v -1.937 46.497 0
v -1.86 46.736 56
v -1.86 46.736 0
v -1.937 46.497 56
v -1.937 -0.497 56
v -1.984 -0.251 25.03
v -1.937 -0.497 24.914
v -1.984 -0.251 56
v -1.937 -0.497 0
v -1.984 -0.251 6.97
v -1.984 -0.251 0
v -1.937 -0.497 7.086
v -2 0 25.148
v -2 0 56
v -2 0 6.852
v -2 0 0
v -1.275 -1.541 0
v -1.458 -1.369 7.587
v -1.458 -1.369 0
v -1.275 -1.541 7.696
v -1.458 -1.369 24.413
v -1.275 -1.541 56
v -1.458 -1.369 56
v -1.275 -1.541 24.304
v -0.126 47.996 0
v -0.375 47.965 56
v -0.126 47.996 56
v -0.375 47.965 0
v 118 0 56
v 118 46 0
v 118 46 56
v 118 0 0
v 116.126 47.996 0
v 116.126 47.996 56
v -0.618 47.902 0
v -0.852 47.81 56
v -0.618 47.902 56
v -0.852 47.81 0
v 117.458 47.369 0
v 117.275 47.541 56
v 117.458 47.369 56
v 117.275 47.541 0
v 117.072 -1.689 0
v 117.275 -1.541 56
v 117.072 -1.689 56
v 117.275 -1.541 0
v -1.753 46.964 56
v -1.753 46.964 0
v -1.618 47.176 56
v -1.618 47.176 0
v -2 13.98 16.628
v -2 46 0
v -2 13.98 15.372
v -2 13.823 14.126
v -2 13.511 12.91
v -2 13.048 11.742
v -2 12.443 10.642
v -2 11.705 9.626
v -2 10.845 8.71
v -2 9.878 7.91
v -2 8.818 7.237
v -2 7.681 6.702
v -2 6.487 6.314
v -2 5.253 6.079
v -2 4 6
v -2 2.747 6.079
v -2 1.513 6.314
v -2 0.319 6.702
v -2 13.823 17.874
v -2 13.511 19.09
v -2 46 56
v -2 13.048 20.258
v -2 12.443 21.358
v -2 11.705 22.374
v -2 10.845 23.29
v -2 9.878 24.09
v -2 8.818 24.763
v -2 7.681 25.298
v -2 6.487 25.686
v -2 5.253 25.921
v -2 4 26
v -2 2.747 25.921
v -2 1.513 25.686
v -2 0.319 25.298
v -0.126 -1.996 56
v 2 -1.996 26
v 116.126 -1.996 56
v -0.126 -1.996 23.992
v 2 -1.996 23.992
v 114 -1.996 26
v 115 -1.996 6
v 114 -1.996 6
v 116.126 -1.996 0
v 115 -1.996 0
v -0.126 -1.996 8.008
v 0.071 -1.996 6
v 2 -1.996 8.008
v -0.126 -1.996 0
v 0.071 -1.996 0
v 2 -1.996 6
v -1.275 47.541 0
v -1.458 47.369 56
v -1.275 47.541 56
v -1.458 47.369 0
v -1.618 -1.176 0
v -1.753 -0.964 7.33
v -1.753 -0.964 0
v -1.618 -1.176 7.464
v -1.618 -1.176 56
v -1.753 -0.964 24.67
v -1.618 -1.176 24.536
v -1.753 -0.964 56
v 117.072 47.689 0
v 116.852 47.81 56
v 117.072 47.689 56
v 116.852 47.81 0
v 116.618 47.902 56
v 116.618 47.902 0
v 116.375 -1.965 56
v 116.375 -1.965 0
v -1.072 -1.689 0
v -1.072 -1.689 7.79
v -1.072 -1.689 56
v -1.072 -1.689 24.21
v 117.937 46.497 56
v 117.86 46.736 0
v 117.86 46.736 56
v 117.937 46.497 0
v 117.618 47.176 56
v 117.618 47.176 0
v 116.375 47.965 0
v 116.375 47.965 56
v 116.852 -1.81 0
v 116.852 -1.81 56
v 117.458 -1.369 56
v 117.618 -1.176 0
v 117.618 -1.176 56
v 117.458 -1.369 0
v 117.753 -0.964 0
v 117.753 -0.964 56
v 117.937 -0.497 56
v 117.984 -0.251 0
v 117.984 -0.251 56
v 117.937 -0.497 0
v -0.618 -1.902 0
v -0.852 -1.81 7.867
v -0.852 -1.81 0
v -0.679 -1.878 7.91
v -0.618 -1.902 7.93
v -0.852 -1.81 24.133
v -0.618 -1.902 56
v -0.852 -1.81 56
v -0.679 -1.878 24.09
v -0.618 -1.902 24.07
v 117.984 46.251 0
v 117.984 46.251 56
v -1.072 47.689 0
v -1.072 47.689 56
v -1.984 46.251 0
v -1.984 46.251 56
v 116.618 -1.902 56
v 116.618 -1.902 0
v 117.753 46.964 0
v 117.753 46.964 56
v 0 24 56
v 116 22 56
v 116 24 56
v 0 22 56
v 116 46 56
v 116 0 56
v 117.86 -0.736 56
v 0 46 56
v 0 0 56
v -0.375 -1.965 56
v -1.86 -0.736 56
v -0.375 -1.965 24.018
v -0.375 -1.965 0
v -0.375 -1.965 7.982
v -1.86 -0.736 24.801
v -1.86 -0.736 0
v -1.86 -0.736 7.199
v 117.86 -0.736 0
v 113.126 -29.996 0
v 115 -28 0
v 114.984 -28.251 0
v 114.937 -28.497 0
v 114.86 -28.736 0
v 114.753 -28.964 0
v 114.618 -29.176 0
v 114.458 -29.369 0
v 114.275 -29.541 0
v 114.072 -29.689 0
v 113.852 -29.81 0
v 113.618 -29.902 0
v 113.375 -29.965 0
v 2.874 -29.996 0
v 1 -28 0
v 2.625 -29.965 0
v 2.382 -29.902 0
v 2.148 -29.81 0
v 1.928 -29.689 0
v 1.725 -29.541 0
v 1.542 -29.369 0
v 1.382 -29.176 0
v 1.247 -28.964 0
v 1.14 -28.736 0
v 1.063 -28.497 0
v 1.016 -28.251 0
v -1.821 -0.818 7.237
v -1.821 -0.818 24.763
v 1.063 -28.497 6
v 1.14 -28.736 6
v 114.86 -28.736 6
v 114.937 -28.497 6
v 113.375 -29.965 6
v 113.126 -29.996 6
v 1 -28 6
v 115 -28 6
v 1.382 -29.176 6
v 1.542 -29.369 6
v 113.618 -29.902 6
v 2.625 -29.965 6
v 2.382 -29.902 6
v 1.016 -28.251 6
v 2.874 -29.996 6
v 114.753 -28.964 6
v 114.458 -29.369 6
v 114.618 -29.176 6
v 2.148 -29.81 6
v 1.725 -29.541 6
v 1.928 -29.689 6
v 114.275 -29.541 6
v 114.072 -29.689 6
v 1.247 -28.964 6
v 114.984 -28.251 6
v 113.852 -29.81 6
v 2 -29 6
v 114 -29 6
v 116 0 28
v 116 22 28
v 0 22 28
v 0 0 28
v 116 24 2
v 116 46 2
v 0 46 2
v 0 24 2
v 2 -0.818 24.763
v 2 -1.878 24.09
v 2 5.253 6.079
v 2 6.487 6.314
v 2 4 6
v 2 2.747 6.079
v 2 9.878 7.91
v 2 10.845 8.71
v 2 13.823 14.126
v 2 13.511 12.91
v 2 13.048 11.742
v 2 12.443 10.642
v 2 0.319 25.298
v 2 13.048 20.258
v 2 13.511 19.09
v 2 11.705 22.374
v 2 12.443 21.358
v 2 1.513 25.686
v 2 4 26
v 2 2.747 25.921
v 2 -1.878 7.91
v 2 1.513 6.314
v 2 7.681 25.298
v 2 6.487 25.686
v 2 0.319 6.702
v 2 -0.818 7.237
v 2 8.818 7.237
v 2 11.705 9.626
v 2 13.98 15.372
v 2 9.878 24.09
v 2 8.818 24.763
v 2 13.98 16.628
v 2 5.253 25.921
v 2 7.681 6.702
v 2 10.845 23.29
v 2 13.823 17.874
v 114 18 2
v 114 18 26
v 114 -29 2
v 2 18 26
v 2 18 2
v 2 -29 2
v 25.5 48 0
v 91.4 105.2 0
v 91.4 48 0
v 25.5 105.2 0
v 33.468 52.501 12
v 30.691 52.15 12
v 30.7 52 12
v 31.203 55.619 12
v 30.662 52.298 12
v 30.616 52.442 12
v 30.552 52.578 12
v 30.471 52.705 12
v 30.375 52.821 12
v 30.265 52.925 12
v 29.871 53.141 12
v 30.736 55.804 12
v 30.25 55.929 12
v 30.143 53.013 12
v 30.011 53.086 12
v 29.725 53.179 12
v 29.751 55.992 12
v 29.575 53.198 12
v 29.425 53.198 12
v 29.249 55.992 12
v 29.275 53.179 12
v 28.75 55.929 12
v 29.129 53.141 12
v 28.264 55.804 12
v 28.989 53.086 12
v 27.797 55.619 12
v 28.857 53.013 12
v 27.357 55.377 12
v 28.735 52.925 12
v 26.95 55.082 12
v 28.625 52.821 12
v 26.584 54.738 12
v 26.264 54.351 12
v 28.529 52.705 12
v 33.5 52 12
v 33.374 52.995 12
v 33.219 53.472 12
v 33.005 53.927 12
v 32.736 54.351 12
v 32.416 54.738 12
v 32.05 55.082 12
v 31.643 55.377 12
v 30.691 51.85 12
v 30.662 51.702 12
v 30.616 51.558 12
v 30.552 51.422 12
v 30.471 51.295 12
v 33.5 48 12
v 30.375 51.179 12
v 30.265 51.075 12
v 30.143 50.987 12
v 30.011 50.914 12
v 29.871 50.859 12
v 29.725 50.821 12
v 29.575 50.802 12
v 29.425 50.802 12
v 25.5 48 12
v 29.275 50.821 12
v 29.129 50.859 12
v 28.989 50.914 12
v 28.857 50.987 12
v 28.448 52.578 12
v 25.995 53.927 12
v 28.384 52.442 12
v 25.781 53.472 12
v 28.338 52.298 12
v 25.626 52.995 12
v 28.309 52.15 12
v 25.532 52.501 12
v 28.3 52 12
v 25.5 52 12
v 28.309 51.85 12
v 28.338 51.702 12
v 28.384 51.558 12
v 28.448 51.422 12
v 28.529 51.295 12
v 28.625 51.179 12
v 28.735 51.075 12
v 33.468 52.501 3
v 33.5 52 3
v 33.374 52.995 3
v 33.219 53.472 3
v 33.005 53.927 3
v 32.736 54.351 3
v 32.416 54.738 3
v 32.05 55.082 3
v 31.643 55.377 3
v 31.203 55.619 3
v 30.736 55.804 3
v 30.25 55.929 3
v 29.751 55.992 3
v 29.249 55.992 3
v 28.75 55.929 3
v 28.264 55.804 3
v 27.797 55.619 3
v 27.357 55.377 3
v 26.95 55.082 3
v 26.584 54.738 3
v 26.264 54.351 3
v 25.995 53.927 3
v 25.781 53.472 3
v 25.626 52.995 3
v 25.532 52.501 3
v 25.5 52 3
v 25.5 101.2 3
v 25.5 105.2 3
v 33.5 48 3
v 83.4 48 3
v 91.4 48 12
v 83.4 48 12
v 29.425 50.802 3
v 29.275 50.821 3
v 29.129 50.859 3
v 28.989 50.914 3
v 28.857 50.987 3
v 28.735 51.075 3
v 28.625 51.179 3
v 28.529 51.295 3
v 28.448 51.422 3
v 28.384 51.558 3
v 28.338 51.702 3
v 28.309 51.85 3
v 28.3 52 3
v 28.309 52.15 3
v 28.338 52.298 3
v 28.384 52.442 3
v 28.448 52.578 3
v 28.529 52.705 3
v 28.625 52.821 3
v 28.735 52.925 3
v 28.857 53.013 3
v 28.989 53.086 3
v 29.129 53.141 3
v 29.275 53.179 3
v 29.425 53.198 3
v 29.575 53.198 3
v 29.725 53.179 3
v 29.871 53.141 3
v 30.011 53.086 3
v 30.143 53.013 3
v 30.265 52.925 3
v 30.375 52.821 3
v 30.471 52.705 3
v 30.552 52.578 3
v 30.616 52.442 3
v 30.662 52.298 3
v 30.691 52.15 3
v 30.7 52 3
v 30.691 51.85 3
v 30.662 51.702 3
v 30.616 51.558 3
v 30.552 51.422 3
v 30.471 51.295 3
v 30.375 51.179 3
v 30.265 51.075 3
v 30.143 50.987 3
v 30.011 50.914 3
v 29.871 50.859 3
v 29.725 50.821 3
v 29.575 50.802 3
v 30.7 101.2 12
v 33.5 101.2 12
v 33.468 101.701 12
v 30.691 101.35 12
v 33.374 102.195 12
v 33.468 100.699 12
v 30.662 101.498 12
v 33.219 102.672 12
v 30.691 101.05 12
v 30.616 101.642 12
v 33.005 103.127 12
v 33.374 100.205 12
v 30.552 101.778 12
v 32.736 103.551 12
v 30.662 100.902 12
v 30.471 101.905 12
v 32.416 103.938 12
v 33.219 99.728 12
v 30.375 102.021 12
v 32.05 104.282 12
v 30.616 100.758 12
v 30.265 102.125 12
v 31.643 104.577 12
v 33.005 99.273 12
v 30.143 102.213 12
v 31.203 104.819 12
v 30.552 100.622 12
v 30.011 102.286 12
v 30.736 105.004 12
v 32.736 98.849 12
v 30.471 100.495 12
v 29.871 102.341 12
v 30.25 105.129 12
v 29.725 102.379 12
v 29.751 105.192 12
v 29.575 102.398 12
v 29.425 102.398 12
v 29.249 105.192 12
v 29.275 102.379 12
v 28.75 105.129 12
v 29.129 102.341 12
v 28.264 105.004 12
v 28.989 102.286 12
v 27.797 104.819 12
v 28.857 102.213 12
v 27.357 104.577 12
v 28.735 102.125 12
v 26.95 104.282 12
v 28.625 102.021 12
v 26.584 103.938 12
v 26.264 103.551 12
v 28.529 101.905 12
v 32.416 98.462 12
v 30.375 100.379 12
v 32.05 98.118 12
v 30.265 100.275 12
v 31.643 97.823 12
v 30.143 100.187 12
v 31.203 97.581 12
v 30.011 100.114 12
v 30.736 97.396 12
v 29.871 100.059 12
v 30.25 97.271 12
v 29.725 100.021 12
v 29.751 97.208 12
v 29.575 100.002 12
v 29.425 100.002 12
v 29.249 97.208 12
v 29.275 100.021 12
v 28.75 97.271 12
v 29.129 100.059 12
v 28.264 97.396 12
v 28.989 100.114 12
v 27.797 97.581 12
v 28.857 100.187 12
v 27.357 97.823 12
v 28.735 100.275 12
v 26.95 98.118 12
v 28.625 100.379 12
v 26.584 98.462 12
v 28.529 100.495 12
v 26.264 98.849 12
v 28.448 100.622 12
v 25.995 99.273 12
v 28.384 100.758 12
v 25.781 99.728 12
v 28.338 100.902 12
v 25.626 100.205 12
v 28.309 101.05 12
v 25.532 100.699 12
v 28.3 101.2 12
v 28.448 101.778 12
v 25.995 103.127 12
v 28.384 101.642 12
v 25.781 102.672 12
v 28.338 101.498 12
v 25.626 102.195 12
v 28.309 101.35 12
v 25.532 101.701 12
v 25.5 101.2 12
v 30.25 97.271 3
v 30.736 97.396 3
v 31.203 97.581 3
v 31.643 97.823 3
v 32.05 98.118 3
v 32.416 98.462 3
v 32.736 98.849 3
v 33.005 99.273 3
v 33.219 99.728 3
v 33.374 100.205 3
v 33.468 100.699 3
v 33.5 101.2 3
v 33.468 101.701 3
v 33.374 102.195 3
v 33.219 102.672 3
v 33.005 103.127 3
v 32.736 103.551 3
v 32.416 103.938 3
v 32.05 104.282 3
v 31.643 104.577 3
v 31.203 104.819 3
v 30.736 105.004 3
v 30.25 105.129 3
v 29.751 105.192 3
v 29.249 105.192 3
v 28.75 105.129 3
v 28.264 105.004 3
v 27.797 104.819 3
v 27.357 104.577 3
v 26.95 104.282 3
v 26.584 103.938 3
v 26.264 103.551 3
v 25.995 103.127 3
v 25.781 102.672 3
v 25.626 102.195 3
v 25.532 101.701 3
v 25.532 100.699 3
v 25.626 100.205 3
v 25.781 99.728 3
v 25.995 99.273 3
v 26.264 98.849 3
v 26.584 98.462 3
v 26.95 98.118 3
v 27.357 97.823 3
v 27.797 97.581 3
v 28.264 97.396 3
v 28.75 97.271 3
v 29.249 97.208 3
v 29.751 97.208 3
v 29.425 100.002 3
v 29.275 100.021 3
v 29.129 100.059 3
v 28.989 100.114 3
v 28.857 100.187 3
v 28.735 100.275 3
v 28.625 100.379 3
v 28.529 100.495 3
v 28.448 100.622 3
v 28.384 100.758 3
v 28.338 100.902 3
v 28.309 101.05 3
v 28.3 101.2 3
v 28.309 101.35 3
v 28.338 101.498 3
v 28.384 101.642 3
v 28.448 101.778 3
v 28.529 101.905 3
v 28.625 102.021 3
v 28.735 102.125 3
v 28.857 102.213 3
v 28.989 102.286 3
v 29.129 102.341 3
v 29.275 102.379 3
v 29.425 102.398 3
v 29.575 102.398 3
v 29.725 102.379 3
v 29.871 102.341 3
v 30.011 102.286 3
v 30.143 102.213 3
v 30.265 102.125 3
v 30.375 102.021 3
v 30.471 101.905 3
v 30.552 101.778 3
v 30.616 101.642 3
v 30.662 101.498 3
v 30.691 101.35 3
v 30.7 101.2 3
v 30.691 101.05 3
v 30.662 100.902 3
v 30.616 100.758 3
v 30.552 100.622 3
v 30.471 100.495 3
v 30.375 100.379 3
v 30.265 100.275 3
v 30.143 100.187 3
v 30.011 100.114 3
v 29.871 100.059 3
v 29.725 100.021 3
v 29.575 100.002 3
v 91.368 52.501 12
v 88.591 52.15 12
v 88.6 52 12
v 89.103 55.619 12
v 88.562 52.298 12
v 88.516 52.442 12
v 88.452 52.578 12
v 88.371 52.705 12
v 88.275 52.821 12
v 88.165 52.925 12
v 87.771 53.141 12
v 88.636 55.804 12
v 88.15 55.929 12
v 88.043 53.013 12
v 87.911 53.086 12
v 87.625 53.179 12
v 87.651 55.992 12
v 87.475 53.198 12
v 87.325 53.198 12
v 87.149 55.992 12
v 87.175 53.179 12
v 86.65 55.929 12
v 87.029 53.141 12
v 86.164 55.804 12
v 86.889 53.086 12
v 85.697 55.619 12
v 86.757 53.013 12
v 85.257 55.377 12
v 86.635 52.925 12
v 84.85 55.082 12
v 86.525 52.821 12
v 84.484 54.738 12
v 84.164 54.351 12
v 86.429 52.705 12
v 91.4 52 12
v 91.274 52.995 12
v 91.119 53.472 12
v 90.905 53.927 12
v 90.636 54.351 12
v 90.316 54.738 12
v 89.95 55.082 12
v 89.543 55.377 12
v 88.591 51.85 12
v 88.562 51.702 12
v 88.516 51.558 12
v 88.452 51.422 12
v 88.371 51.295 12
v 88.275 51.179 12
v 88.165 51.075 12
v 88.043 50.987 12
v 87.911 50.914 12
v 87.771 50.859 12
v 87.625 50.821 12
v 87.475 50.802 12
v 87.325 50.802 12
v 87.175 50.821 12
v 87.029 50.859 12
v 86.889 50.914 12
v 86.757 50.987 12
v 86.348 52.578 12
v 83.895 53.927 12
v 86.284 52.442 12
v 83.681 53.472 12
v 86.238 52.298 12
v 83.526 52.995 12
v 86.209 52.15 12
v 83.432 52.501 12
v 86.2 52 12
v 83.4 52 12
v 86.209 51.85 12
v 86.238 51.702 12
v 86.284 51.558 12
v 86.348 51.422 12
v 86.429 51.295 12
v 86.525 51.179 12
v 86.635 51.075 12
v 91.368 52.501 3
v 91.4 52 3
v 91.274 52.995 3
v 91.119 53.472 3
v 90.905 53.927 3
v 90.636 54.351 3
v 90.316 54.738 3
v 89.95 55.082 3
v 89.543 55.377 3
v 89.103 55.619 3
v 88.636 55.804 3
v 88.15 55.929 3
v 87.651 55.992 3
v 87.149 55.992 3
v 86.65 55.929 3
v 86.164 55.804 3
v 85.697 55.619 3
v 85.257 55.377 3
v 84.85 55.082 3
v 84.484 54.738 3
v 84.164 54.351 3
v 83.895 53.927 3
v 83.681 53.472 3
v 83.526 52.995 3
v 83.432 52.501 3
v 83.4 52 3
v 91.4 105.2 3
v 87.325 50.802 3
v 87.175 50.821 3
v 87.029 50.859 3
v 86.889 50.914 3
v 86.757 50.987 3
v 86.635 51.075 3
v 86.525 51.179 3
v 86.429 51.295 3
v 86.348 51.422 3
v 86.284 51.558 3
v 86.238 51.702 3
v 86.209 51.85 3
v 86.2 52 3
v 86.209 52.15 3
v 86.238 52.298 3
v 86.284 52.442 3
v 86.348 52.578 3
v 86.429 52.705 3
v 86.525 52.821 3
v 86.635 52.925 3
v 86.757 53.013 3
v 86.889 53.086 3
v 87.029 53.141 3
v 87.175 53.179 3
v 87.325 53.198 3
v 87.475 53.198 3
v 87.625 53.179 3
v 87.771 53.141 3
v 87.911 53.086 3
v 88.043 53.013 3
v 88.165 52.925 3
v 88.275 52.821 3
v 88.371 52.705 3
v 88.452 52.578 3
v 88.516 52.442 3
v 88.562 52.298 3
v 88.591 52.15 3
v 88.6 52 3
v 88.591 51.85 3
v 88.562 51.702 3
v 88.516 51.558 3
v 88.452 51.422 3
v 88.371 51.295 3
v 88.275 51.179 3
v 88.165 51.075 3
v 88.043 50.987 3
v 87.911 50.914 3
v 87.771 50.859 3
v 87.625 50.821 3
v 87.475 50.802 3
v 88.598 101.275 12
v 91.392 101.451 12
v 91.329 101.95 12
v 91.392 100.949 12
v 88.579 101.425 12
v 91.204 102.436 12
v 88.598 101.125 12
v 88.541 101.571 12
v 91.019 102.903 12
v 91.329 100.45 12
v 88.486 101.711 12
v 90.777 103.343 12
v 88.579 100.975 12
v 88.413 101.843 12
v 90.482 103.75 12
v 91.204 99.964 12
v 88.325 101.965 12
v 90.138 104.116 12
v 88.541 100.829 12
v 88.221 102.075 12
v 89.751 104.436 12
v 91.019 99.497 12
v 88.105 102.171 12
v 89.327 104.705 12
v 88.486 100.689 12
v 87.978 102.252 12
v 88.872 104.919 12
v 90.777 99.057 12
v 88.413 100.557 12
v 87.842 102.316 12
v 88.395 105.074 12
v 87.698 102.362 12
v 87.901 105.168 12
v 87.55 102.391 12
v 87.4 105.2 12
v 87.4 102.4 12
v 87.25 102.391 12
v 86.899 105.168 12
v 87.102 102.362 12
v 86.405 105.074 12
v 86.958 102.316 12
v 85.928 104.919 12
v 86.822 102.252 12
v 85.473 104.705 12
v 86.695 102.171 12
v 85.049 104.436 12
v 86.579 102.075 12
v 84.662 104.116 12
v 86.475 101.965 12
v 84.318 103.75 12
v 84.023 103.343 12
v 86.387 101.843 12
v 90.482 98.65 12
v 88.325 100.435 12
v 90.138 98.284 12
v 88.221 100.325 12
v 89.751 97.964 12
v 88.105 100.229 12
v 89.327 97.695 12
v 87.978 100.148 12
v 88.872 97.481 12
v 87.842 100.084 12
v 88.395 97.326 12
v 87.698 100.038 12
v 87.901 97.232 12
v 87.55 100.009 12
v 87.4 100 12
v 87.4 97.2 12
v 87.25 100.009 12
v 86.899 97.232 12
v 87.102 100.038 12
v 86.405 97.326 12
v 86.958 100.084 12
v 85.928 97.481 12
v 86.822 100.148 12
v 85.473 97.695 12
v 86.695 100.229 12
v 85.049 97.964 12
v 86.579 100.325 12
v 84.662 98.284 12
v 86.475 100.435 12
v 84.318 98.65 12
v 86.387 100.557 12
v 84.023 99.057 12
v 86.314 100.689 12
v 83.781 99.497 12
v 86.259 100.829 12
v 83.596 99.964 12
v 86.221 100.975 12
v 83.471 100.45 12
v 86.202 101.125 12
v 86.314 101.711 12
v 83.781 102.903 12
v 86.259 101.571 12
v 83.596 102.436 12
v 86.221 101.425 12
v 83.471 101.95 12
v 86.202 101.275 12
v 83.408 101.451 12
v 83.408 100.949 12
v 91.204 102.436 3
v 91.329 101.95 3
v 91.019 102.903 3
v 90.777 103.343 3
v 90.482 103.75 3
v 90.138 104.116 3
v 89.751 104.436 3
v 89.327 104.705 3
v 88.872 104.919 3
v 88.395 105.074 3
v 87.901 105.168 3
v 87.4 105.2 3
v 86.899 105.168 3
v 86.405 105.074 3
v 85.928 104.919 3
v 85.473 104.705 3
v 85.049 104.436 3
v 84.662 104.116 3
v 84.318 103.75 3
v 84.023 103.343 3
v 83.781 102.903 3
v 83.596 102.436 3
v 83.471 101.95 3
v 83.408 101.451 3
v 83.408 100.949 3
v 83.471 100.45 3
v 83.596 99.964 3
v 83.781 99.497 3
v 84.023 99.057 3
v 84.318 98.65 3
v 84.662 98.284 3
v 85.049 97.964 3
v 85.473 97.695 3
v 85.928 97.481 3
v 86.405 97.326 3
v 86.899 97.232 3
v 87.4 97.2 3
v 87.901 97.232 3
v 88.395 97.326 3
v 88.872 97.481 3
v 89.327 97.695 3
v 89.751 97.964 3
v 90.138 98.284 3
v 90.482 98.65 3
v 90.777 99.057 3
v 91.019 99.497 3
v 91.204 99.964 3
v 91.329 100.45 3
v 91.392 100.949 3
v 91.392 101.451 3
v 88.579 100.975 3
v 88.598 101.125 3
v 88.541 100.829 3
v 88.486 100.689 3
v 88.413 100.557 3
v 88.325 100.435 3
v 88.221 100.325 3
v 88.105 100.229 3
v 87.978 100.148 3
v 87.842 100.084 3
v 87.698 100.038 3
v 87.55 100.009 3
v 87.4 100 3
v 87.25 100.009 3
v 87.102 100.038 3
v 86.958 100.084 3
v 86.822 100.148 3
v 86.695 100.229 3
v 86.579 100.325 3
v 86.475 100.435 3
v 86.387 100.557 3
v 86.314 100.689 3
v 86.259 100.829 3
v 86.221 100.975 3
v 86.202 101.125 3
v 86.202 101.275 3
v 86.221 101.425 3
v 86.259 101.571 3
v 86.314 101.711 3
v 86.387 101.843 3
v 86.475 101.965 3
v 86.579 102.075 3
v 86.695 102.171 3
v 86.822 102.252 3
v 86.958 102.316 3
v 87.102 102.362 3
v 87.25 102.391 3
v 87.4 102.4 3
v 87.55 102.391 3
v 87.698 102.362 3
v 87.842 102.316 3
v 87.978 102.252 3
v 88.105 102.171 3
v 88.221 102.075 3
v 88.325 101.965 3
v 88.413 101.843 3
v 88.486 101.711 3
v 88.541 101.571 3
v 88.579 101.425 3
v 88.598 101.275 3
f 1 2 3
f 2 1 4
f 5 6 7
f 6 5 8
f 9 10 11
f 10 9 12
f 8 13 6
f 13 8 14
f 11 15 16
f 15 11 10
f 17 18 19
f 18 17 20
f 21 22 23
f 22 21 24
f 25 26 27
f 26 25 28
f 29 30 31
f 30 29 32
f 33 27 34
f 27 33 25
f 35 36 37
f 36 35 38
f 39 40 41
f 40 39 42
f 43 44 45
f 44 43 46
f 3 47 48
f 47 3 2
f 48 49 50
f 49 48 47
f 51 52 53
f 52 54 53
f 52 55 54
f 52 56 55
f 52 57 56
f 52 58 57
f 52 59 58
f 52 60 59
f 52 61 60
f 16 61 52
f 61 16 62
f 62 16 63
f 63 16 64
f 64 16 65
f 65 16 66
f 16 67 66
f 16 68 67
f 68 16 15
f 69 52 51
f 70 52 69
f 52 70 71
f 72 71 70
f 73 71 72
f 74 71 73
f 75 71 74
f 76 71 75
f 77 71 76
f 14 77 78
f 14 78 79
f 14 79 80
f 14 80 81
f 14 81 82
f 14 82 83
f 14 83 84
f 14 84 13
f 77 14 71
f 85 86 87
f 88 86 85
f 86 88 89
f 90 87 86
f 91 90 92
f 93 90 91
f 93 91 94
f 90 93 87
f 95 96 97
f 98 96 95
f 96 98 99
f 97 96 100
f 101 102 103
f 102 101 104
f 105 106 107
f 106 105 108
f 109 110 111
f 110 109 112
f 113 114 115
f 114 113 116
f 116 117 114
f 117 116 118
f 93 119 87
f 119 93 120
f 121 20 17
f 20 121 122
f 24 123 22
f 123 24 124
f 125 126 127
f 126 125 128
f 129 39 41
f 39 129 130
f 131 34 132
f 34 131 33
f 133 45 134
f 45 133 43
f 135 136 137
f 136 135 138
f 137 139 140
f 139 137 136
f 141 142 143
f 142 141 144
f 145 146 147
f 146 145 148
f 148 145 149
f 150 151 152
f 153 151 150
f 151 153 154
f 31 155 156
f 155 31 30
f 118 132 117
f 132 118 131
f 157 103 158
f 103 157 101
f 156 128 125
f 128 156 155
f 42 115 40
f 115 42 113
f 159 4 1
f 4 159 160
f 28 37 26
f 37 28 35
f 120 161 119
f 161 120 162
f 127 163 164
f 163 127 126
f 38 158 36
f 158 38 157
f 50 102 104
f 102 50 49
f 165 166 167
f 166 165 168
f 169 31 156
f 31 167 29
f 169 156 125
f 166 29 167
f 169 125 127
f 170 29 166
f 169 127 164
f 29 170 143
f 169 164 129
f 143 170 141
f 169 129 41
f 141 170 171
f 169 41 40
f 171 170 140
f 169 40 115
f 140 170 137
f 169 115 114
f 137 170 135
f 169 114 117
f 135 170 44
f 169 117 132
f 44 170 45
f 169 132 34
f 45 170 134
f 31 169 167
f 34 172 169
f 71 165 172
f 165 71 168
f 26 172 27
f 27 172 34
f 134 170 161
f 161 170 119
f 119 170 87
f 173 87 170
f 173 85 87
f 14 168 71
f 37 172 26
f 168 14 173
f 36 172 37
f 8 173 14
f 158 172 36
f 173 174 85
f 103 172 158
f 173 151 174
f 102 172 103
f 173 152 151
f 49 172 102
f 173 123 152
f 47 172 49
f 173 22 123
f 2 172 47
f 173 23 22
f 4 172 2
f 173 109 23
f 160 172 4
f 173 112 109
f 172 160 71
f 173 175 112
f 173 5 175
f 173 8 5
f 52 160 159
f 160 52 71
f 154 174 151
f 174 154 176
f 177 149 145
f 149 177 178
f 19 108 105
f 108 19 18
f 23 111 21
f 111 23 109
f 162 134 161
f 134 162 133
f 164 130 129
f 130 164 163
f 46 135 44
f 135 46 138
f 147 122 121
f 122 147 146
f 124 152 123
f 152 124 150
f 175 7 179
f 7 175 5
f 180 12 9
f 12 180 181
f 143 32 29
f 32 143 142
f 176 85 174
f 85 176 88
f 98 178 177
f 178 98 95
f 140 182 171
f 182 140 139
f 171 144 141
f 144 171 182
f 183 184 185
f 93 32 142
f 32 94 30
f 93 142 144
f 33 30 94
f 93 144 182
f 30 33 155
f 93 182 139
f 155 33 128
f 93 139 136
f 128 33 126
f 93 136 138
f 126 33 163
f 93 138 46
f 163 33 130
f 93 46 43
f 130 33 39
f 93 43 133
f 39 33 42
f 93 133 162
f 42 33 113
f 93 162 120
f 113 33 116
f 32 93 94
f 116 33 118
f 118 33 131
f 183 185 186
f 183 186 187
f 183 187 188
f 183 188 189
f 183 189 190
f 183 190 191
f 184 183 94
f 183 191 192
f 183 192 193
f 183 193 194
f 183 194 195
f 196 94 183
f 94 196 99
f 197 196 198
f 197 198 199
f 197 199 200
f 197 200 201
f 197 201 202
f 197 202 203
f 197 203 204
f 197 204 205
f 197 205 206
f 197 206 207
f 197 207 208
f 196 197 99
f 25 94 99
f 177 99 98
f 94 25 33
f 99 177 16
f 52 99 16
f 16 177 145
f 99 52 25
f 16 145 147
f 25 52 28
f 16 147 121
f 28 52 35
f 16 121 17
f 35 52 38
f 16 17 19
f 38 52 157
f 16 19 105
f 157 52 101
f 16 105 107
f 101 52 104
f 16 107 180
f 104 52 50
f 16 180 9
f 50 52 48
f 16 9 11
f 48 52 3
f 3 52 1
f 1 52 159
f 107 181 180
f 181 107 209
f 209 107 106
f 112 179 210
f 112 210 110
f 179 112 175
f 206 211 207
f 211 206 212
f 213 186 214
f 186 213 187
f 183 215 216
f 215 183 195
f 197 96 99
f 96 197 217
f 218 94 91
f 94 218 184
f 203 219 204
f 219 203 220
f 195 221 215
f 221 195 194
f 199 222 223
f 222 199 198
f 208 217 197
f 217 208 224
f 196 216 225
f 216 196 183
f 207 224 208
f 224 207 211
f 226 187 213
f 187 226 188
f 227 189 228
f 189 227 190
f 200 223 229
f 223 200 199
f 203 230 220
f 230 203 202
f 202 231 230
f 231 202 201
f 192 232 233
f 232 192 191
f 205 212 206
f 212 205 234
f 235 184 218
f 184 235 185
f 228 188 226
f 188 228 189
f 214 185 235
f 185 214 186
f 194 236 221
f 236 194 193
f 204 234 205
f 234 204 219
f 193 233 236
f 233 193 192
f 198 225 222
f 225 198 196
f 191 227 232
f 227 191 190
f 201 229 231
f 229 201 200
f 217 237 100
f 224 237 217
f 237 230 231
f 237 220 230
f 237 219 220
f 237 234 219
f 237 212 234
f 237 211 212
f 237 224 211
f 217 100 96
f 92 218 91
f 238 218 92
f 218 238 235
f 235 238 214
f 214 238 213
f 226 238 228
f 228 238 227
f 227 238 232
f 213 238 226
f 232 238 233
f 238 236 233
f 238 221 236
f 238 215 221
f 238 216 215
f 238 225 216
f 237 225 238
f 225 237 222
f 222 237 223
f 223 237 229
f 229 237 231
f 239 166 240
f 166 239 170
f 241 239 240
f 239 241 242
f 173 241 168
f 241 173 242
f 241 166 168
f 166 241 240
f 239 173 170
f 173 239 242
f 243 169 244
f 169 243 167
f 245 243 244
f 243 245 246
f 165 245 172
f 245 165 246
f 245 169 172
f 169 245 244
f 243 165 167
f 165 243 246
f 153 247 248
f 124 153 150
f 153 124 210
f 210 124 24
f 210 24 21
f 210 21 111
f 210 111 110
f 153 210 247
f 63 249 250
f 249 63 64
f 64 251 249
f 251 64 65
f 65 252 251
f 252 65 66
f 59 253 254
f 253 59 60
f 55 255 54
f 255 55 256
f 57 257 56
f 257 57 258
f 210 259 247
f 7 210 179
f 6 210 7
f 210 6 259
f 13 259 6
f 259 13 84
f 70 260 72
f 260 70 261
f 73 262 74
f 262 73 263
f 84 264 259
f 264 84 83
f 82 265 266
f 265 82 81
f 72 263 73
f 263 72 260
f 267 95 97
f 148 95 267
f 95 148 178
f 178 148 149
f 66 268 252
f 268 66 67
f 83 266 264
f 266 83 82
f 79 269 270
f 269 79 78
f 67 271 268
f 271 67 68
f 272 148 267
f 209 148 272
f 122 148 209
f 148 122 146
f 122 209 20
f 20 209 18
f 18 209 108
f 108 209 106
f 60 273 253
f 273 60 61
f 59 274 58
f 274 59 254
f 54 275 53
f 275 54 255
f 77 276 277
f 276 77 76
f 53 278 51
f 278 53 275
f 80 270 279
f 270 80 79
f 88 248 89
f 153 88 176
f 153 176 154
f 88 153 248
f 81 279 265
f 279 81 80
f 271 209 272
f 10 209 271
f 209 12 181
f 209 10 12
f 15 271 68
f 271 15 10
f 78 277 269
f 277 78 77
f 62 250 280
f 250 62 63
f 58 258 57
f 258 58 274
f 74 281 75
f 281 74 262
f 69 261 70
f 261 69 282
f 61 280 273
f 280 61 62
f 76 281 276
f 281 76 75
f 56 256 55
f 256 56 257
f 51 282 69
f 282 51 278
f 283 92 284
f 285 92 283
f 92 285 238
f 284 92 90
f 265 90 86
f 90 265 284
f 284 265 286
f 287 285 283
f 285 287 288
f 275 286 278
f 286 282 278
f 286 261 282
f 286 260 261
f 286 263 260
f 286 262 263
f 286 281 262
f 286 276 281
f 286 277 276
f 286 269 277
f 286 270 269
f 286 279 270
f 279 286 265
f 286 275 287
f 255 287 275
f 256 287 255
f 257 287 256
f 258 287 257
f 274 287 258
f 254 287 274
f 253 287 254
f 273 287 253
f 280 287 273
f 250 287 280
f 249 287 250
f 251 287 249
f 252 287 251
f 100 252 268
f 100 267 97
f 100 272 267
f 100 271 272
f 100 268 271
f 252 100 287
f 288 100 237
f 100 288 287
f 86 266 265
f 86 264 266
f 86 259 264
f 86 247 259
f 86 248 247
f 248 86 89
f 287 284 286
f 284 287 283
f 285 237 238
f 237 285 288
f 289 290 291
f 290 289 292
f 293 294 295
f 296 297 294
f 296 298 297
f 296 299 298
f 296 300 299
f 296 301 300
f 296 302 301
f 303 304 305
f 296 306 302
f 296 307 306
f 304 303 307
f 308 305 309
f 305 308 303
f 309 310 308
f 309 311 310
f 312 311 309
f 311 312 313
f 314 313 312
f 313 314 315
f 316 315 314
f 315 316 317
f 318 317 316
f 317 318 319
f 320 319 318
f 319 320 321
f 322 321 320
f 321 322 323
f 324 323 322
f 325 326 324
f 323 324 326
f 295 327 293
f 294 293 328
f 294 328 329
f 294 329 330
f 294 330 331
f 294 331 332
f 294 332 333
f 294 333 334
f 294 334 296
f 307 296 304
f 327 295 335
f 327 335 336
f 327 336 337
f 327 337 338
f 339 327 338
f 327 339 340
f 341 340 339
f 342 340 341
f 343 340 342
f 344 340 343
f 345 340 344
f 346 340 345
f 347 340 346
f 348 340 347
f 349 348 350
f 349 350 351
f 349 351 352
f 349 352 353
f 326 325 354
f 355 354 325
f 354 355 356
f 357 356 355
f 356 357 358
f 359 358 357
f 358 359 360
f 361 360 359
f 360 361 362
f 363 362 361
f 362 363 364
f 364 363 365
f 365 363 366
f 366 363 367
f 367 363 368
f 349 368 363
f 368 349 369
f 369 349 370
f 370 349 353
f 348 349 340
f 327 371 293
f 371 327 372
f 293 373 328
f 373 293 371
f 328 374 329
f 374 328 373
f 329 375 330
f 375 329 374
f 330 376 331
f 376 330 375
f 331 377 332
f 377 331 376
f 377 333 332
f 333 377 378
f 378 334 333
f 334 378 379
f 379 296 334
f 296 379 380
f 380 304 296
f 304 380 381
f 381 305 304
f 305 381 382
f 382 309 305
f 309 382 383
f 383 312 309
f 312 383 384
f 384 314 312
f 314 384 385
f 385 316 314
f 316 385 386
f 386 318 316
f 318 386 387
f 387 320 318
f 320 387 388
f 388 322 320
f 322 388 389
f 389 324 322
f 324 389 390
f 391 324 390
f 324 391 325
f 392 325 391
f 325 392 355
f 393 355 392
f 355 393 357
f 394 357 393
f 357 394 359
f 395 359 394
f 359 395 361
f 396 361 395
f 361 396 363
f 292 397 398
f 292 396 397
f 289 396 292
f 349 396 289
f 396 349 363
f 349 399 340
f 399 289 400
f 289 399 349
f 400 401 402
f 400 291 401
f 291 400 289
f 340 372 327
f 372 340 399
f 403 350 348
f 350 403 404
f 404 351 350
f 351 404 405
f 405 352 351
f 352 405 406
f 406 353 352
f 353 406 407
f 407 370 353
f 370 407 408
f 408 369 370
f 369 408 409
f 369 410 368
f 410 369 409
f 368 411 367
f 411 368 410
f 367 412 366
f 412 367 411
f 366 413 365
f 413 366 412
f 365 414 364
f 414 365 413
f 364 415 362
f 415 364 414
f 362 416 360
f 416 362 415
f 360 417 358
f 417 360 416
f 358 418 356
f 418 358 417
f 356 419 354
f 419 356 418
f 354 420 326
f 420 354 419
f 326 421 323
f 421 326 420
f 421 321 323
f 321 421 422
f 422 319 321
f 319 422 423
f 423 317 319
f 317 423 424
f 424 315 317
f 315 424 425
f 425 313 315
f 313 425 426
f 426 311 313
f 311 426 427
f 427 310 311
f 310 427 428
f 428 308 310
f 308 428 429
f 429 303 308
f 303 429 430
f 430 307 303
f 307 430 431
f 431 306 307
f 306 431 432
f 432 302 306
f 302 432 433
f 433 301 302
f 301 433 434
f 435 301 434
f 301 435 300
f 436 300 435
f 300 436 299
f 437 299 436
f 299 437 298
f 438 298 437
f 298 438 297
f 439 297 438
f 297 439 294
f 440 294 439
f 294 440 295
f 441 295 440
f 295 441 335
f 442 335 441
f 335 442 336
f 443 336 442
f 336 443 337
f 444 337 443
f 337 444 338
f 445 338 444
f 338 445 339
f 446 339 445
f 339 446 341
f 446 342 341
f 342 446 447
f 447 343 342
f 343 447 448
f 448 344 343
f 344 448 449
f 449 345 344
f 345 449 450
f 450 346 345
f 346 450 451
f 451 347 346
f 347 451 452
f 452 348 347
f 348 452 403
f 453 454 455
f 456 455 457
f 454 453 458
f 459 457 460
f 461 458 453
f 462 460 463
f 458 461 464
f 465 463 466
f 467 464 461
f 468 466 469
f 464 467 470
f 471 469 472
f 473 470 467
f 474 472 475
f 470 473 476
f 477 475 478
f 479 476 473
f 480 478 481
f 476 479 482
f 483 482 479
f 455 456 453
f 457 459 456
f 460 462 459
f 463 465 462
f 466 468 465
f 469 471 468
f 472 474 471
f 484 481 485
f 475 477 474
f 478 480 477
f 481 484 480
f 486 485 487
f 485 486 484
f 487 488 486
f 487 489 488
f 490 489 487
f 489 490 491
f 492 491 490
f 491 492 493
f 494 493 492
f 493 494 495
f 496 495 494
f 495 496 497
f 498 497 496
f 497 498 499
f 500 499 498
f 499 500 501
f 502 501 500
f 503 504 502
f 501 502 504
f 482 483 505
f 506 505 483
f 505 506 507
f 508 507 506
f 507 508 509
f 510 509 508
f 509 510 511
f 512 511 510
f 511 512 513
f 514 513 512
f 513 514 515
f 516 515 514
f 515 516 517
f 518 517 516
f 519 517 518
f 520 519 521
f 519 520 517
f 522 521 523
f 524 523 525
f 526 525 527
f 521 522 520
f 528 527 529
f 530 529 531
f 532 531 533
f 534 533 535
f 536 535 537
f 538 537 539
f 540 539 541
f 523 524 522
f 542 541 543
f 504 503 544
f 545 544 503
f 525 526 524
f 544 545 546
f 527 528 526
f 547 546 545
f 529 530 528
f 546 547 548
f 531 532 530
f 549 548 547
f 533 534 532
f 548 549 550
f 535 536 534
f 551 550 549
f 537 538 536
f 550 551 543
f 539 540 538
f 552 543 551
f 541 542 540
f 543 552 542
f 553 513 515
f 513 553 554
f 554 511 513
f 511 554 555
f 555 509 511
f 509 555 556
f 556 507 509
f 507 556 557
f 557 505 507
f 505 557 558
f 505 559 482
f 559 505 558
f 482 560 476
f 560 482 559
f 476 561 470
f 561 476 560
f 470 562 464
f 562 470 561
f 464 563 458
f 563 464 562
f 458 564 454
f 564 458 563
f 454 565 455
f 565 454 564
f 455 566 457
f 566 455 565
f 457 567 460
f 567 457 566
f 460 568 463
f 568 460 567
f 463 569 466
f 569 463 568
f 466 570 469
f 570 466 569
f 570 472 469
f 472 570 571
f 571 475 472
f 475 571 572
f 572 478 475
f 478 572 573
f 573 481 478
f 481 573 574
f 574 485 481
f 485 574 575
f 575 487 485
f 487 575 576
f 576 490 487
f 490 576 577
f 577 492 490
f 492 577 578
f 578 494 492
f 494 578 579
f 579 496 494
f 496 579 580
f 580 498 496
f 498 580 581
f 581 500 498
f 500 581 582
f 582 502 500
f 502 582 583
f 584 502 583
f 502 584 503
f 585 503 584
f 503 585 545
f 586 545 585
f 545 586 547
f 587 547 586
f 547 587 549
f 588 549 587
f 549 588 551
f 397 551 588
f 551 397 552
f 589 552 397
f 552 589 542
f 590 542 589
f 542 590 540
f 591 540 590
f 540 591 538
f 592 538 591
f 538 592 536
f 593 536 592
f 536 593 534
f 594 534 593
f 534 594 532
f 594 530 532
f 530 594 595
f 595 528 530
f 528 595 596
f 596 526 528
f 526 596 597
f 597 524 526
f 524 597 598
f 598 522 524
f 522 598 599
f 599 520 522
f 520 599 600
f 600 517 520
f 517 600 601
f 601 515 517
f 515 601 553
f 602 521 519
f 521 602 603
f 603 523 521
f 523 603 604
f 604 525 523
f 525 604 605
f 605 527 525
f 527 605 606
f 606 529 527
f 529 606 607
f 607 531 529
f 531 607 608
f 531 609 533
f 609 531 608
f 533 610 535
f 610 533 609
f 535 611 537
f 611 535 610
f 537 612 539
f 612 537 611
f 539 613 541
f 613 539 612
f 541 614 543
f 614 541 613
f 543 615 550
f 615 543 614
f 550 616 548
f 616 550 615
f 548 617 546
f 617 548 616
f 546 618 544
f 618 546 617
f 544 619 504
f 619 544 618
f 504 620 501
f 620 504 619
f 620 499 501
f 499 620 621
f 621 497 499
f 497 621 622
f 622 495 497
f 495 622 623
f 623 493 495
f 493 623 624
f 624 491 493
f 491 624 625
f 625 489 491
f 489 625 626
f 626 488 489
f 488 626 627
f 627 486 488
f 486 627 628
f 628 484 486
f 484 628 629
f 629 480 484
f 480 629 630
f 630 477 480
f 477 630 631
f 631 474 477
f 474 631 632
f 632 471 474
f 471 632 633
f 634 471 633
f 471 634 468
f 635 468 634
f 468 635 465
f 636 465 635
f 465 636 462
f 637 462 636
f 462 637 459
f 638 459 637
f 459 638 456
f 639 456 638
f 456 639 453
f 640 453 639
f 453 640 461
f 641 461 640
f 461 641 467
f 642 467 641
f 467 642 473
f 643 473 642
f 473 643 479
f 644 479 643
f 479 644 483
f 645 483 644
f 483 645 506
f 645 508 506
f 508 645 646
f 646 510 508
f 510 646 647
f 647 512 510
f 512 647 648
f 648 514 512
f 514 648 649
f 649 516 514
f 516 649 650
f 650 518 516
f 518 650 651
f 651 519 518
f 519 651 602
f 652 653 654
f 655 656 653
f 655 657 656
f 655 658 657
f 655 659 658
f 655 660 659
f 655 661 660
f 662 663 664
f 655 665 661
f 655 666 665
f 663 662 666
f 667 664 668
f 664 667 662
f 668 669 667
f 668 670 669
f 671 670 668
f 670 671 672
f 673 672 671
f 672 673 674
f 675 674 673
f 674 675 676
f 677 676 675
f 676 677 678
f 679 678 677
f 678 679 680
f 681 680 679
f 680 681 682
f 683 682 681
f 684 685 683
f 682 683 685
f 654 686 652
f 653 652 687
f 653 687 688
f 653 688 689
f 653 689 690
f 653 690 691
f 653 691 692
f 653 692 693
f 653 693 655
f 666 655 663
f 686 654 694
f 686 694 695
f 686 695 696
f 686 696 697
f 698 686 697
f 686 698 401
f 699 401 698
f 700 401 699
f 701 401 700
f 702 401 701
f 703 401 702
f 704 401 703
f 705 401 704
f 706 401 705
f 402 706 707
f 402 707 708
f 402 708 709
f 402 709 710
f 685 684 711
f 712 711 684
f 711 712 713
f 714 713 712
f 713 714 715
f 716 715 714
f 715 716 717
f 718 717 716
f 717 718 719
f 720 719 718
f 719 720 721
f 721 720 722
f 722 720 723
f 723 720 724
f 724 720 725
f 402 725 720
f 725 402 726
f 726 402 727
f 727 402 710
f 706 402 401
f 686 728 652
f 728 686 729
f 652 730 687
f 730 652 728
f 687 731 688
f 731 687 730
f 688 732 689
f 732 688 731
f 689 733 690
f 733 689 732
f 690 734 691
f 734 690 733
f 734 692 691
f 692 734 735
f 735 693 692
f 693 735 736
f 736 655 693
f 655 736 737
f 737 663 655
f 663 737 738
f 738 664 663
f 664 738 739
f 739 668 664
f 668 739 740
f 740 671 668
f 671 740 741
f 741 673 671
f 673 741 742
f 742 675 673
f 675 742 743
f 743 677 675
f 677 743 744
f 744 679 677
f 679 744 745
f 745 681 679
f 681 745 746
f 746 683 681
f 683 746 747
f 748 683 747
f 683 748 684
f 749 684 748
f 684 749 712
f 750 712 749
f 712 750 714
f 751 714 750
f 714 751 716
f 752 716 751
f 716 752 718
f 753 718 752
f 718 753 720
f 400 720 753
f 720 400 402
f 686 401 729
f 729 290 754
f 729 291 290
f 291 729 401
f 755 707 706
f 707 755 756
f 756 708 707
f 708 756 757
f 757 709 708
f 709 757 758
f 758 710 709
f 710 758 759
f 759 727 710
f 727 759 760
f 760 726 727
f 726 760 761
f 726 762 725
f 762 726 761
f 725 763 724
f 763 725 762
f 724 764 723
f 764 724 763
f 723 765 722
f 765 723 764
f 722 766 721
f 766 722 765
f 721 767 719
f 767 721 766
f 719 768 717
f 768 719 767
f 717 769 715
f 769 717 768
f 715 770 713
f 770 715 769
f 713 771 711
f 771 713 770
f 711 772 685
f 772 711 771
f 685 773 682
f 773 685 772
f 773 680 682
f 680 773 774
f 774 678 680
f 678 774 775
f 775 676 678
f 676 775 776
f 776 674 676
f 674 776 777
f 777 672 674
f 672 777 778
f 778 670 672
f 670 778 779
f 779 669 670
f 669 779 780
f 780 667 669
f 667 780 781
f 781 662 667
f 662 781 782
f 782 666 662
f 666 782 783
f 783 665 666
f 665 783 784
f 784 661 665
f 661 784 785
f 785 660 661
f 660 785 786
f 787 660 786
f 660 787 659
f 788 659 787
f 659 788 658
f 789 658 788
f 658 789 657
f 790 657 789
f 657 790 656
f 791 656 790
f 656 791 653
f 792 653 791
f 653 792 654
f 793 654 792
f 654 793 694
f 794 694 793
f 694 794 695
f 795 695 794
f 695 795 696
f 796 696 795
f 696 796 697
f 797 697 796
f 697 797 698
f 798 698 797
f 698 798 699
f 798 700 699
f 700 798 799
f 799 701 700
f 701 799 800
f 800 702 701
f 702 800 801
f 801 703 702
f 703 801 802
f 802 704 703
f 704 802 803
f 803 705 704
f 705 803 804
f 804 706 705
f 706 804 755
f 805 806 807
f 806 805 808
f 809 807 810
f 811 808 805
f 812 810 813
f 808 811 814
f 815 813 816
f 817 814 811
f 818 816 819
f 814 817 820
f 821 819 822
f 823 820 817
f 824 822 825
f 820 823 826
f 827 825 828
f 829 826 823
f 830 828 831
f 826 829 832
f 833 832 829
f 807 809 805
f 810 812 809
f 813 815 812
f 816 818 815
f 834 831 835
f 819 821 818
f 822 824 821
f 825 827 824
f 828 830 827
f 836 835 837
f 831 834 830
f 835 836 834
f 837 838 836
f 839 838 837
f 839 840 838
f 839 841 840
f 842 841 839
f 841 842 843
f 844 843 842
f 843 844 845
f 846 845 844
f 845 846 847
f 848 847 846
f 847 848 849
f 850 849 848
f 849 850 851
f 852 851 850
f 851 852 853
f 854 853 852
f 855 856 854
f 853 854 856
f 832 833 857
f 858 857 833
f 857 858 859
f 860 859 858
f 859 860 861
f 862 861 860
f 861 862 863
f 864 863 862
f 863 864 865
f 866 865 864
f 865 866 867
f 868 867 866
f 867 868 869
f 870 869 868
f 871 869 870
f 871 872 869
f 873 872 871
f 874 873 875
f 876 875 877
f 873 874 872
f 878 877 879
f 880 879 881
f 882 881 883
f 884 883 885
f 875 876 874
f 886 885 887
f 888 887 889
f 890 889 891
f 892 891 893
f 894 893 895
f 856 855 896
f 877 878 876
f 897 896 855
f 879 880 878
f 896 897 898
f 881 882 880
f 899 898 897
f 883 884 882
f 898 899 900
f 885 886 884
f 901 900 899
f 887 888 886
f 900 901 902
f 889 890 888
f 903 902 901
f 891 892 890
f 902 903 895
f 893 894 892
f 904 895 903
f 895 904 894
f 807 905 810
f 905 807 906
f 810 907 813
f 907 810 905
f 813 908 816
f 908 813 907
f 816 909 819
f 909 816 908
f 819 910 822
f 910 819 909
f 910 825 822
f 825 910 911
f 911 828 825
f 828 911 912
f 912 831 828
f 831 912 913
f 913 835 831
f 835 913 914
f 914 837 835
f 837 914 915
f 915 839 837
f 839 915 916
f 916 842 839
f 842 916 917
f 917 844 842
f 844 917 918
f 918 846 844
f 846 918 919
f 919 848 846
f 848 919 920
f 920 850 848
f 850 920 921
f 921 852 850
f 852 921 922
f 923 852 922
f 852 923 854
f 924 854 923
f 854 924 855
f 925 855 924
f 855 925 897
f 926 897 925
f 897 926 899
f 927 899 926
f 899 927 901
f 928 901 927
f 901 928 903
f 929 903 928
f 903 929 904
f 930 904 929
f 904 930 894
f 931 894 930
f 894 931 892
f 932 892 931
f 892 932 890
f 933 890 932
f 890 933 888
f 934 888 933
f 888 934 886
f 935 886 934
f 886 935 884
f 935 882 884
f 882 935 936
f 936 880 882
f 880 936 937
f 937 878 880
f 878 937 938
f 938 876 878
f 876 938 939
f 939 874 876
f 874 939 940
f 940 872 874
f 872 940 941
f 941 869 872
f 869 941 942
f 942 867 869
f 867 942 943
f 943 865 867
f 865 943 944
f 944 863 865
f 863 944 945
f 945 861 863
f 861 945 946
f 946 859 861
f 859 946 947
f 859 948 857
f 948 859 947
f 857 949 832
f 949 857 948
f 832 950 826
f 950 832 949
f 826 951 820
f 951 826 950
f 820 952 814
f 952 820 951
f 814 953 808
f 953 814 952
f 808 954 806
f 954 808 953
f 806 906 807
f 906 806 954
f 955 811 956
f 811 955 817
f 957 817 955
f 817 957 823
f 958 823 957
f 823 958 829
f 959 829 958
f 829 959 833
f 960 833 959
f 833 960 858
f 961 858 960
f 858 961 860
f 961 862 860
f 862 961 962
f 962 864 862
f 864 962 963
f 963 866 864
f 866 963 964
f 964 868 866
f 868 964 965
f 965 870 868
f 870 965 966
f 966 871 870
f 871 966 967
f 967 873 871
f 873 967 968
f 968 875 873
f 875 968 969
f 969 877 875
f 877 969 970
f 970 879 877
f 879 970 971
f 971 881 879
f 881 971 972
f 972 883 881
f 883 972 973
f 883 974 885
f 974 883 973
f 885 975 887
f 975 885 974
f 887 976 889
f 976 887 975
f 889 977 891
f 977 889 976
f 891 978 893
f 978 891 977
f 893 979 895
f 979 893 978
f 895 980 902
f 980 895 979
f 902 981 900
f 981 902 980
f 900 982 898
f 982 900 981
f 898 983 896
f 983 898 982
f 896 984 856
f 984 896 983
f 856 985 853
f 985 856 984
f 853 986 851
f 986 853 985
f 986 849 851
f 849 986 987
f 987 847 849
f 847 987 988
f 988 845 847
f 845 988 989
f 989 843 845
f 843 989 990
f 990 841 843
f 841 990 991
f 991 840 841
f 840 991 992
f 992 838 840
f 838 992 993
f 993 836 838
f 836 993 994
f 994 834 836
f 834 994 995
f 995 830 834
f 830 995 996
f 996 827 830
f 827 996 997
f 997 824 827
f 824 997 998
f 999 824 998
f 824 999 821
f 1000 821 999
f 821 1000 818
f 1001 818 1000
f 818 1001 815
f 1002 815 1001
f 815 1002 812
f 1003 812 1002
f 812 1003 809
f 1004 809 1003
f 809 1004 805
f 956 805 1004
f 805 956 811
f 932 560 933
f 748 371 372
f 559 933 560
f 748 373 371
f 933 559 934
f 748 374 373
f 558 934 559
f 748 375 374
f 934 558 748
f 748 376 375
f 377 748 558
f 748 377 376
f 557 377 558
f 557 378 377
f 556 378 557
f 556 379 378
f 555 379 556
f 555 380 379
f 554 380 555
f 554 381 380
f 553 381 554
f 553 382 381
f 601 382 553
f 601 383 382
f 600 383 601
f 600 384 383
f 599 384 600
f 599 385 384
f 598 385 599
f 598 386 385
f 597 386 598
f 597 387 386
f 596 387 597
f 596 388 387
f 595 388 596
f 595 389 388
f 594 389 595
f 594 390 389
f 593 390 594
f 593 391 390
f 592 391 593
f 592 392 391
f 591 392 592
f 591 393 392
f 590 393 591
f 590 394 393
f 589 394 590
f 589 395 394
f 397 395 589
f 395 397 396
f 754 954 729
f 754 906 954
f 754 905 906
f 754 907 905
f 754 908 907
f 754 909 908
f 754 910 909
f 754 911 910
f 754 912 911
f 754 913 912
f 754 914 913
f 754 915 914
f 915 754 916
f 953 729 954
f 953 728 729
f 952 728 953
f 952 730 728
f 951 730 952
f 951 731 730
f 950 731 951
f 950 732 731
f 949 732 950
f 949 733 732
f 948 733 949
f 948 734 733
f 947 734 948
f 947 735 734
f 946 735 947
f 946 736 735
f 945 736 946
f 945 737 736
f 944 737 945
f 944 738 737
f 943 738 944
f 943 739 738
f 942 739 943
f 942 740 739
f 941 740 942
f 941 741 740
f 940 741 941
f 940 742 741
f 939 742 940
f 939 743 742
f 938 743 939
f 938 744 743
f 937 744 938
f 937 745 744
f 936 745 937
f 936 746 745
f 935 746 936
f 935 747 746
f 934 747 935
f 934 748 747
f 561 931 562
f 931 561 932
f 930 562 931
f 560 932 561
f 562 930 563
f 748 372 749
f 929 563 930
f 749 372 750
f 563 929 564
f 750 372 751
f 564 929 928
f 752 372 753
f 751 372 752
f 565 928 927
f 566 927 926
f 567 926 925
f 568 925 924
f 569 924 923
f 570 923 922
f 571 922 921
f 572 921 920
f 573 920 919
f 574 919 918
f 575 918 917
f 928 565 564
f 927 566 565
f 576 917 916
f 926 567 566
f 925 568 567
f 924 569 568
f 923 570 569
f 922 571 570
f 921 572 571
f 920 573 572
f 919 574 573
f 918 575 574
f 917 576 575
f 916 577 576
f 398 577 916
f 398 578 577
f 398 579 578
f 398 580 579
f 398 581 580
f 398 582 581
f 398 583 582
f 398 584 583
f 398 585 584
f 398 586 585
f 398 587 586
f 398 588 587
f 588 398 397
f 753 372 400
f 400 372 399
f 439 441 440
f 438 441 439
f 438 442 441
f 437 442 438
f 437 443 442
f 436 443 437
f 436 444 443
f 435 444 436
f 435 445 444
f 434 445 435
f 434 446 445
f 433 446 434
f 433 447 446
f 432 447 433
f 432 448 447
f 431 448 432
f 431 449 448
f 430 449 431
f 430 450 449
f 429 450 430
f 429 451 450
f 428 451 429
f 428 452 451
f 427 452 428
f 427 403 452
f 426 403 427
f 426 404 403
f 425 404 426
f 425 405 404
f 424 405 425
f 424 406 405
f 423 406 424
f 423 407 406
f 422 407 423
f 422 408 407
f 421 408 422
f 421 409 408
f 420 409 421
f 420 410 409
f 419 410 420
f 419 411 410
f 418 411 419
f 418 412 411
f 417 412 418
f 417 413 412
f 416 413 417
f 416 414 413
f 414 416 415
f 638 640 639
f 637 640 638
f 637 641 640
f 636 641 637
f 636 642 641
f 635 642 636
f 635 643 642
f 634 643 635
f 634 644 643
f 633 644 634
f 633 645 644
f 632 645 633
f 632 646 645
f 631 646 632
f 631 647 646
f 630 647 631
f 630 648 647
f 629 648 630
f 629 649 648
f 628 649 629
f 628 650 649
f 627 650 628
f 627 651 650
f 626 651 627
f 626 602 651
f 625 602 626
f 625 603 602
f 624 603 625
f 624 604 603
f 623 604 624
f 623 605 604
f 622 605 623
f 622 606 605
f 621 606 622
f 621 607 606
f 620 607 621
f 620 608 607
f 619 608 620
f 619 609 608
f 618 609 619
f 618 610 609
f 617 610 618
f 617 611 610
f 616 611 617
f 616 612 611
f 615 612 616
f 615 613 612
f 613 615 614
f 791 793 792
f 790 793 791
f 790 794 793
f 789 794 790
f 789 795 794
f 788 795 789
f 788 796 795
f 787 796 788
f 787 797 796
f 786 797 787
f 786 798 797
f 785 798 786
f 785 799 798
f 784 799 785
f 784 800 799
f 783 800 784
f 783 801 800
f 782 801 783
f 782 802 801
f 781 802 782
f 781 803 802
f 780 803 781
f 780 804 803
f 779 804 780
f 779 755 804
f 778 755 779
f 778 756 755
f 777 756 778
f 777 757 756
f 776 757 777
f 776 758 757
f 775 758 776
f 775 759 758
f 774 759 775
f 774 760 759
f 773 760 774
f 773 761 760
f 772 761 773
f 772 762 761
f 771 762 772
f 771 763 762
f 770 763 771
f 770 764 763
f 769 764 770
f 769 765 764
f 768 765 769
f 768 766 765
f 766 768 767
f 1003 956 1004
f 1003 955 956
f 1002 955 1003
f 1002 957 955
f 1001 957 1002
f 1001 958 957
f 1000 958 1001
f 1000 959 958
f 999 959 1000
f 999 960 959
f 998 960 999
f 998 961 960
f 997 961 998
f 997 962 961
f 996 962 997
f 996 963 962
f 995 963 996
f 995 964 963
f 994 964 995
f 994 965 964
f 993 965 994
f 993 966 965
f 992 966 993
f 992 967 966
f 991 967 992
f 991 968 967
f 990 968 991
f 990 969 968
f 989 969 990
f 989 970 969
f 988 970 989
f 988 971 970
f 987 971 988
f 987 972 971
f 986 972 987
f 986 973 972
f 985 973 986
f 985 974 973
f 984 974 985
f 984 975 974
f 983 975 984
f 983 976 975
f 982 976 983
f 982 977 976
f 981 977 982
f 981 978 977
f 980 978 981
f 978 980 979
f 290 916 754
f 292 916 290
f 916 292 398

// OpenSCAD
// file: ../rpi.scad
 // include <./RPi4board-modded.scad>;



// translate([5, 61, 5])
  // rotate([0, 0, 270])
   // board_raspberrypi_4_model_b();


// rpi4([2, 2, 2], [0, 0, 2]);


slop=0.01;
module rpi4(
  rpi_buffer, 
  rpi_padding,
  expose_card=false,
  expose_hdmi=false,
  expose_usb1=false,
  expose_usb2=false,
  expose_ribbon_cable=false,
  expose_gpio_pins=false,
  head_room=4
  )
{
  rpi_screws=[58, 49, 3];
  rpi_size=[88, 58, 13];

  difference() {
    gen_rpi(rpi_screws, rpi_size, rpi_buffer, rpi_padding, expose_card, expose_hdmi, expose_usb1,   expose_usb2, expose_ribbon_cable, expose_gpio_pins, head_room);
  
    // usb 1
    translate([92, 6, 5])
      cube([16, 16, 18]);

    // usb 2
    translate([92, 24, 5])
      cube([16, 16, 18]);

    // ethernet
    translate([92, 42, 5])
      cube([16, 18, 16]);

    // power
    translate([9, -slop, rpi_padding.z + rpi_buffer.z])
      cube([14, rpi_buffer.x + 2*slop, 7]);

    // hdmi
    translate([26.5, -slop, rpi_padding.z + rpi_buffer.z])
      cube([9, rpi_buffer.x + 2*slop, 5]);

    // hdm2
    translate([40, -slop, rpi_padding.z + rpi_buffer.z])
      cube([9, rpi_buffer.x + 2*slop, 5]);

  }
}

module rpi0(
  rpi_buffer, 
  rpi_padding,
  expose_card=false,
  expose_hdmi=false,
  expose_usb1=false,
  expose_usb2=false,
  expose_ribbon_cable=false,
  expose_gpio_pins=false,
  head_room=4
  )
{
  rpi_screws=[58, 23, 3];
  rpi_size=[65, 30, 3];

  gen_rpi(rpi_screws, rpi_size, rpi_buffer, rpi_padding, expose_card, expose_hdmi, expose_usb1, expose_usb2, expose_ribbon_cable, expose_gpio_pins, head_room);
  
  
  
}

module gen_rpi(
  rpi_screws, 
  rpi_size,
  
  rpi_buffer, 
  rpi_padding,
  expose_card=false,
  expose_hdmi=false,
  expose_usb1=false,
  expose_usb2=false,
  expose_ribbon_cable=false,
  expose_gpio_pins=false,
  head_room=4
  )
{
  rpi_envelope=rpi_size + [2, 2, 4];
  sdcard_allowance= expose_card ? 0 : 2;

  mezz_height= max( rpi_padding.z, 3);
  rpi_cutout = rpi_envelope + rpi_padding * 2 - [0, 0, rpi_padding.z];
  rpi_origin = rpi_buffer;
    
  difference()
  {
    union()
    {
      difference()
      {
        cube(rpi_cutout + rpi_buffer + [rpi_buffer.x + sdcard_allowance, rpi_buffer.y, head_room]);
        translate(rpi_origin + [0,0,0])
        cube(rpi_cutout + [0,0,rpi_padding.z + rpi_buffer.z + slop]);
      }
      
      translate(rpi_origin + [rpi_padding.x + 3, rpi_padding.y + 3, 0])
        screws(rpi_screws, mezz_height);
    }
    
    
    
    
    // graphics ribbon
    if (expose_ribbon_cable) {
      translate(rpi_buffer + [-rpi_buffer.x - slop, 7, rpi_buffer.z + rpi_padding.z])
      cube([rpi_buffer.x + rpi_padding.x + slop + slop, 17, rpi_cutout.z]);
    }

    // sd card slot
    if (expose_card) {
      translate(rpi_buffer + [rpi_envelope.x - slop - 1, 11, -rpi_buffer.z - slop])
      cube([rpi_buffer.x + 10 + sdcard_allowance, 15, rpi_cutout.z + rpi_buffer.z*3]);
    }

    if (expose_gpio_pins) {
      translate(rpi_buffer + rpi_padding + [7, -rpi_buffer.y -slop, 0])
      cube([rpi_buffer.x + 12 + 39, rpi_buffer.y + 1 + slop*2, rpi_cutout.z + slop]);
    }

    translate(rpi_buffer + [1, rpi_envelope.y - slop, rpi_buffer.z + rpi_padding.z - 1])
    {
      // usb slot
      if (expose_usb2) {
        translate([5, 0, 0])
        cube([11, rpi_buffer.y + slop*2, 8]);
      }
      // usb slot
      if (expose_usb1) {
        translate([19, 0, 0])
        cube([11, rpi_buffer.y + slop*2, 8]);
      }
      // hdmi
      if (expose_hdmi) {
        translate([44.6, 0, 0])
        cube([16, rpi_buffer.y + slop*2, 8]);
      }
    }
  }
}

module screws(rpi_screws, screw_height)
{
  screw_mount(screw_height, 0);

  translate([rpi_screws.x, 0, 0])
  screw_mount(screw_height, 90);

  translate([rpi_screws.x, rpi_screws.y, 0])
  screw_mount(screw_height, 180);

  translate([0, rpi_screws.y, 0])
  screw_mount(screw_height, 270);
}

module screw_mount(screw_mount_height, rotation)
{
  difference()
  {
    screw_diameter = 1.25;
    screw_mount_dia = 3.5;
    
    translate([screw_mount_dia/2 + 1.75, screw_mount_dia/2 + 1.75, 0])
    rotate(rotation)
    linear_extrude(screw_mount_height)
    hull() {
      mount_size = screw_mount_dia;
      circle(mount_size);
      polygon([[-mount_size, mount_size], [-mount_size,-mount_size], [mount_size,-mount_size]]);
    }
    translate([screw_mount_dia/2 + 1.75, screw_mount_dia/2 +  1.75, slop])
    cylinder(r = screw_diameter, h = screw_mount_height);
  }
}
// main file
use <../rpi.scad>;


$fn = 50;
show_caddy=false;

module __Customizer_Limit__ () {}

expose_card=false;
expose_hdmi=false;
expose_usb1=true;
expose_usb2=false;
expose_ribbon_cable=false;
expose_gpio_pins=false;

base_width=116;
base_height=56;
drive_height=30;
floor_height=2;
corner_radius=2;
slop = 0.01;
post_height=18;

usb_hub = [112,47,24];
usb_hub_overhang = 18;
usb_drive=[116,22,74];
cpu_bay=[86, 65, 26];
cpu_bay_height=12;
wall_thickness=2.0;
base_depth=usb_drive.y*2 + wall_thickness*3 + cpu_bay.y;

module chomp_stand()
{
  union()
  {
  difference()
  {
    base();
    hd_bays();
    cpu_bay();
    cutaways();
    usb_hub_bay();
  }
  chomp_base();
  }
}

module chomp_base()
{
    translate([25.5,48])
  linear_extrude(3)
  color("red")
  square([65.9,57.2]);
  
  translate([25,0])
    screw_posts();

}

module usb_hub_bay()
{
  translate([(base_width - usb_hub.x) / 2, usb_hub_overhang - usb_hub.y, floor_height])

  cube(usb_hub);
}

module cutaways()
{

    translate([0, usb_drive.y*2 + wall_thickness*2 + 20, floor_height])
    linear_extrude(20)
    square([12 + slop, 26]);
  
      rotate([0,90,0])
    translate([-16,4,-2- slop])
   linear_extrude(4 + slop + slop)
   circle(10);

}

module screw_posts()
{
  translate([4.5, 52])
  screw_post(true);

  translate([4.5, 101.2])
  screw_post(false);

  translate([62.4, 52])
  screw_post(true);

  translate([62.4, 101.2])
  rotate(90)
  screw_post(false);
}

module screw_post(sqr_it)
{
  linear_extrude(cpu_bay_height)
  difference()
  {
    union()
  {
    circle(4);
    if ( sqr_it ) {
      translate([-4, -4]) square([8,4]);
    }
  }
    circle(1.2);
}
}

module cpu_bay()
{
    translate([-corner_radius - slop + 14, 48, floor_height])
    cube(cpu_bay);
}

module base()
{
    linear_extrude(base_height)
    {
      hull() {
        circle(corner_radius);
        translate([base_width,0]) circle(corner_radius);
        translate([0,usb_drive.y*2 + wall_thickness]) circle(corner_radius);
        translate([base_width, usb_drive.y*2 + wall_thickness]) circle(corner_radius);
      }
    }
    linear_extrude(floor_height*3)
    {
      hull() {
        translate([0,0]) square(corner_radius);
        translate([base_width - 3,0]) square(corner_radius);
        translate([3,-28]) circle(corner_radius);
        translate([base_width - 3, -28]) circle(corner_radius);
      }
    }
}

module hd_bays()
{
    translate([0, 0, floor_height + usb_hub.z + wall_thickness])
    cube(usb_drive);

    translate([0, 24, floor_height])
    cube(usb_drive);
}

if (show_caddy) {
  color("blue")
  translate([74, 40, 8])
  rotate([270,180, 0])
  import("/Users/steve/Documents/scad models/chomp/chasis.STL");
}

chomp_stand();
